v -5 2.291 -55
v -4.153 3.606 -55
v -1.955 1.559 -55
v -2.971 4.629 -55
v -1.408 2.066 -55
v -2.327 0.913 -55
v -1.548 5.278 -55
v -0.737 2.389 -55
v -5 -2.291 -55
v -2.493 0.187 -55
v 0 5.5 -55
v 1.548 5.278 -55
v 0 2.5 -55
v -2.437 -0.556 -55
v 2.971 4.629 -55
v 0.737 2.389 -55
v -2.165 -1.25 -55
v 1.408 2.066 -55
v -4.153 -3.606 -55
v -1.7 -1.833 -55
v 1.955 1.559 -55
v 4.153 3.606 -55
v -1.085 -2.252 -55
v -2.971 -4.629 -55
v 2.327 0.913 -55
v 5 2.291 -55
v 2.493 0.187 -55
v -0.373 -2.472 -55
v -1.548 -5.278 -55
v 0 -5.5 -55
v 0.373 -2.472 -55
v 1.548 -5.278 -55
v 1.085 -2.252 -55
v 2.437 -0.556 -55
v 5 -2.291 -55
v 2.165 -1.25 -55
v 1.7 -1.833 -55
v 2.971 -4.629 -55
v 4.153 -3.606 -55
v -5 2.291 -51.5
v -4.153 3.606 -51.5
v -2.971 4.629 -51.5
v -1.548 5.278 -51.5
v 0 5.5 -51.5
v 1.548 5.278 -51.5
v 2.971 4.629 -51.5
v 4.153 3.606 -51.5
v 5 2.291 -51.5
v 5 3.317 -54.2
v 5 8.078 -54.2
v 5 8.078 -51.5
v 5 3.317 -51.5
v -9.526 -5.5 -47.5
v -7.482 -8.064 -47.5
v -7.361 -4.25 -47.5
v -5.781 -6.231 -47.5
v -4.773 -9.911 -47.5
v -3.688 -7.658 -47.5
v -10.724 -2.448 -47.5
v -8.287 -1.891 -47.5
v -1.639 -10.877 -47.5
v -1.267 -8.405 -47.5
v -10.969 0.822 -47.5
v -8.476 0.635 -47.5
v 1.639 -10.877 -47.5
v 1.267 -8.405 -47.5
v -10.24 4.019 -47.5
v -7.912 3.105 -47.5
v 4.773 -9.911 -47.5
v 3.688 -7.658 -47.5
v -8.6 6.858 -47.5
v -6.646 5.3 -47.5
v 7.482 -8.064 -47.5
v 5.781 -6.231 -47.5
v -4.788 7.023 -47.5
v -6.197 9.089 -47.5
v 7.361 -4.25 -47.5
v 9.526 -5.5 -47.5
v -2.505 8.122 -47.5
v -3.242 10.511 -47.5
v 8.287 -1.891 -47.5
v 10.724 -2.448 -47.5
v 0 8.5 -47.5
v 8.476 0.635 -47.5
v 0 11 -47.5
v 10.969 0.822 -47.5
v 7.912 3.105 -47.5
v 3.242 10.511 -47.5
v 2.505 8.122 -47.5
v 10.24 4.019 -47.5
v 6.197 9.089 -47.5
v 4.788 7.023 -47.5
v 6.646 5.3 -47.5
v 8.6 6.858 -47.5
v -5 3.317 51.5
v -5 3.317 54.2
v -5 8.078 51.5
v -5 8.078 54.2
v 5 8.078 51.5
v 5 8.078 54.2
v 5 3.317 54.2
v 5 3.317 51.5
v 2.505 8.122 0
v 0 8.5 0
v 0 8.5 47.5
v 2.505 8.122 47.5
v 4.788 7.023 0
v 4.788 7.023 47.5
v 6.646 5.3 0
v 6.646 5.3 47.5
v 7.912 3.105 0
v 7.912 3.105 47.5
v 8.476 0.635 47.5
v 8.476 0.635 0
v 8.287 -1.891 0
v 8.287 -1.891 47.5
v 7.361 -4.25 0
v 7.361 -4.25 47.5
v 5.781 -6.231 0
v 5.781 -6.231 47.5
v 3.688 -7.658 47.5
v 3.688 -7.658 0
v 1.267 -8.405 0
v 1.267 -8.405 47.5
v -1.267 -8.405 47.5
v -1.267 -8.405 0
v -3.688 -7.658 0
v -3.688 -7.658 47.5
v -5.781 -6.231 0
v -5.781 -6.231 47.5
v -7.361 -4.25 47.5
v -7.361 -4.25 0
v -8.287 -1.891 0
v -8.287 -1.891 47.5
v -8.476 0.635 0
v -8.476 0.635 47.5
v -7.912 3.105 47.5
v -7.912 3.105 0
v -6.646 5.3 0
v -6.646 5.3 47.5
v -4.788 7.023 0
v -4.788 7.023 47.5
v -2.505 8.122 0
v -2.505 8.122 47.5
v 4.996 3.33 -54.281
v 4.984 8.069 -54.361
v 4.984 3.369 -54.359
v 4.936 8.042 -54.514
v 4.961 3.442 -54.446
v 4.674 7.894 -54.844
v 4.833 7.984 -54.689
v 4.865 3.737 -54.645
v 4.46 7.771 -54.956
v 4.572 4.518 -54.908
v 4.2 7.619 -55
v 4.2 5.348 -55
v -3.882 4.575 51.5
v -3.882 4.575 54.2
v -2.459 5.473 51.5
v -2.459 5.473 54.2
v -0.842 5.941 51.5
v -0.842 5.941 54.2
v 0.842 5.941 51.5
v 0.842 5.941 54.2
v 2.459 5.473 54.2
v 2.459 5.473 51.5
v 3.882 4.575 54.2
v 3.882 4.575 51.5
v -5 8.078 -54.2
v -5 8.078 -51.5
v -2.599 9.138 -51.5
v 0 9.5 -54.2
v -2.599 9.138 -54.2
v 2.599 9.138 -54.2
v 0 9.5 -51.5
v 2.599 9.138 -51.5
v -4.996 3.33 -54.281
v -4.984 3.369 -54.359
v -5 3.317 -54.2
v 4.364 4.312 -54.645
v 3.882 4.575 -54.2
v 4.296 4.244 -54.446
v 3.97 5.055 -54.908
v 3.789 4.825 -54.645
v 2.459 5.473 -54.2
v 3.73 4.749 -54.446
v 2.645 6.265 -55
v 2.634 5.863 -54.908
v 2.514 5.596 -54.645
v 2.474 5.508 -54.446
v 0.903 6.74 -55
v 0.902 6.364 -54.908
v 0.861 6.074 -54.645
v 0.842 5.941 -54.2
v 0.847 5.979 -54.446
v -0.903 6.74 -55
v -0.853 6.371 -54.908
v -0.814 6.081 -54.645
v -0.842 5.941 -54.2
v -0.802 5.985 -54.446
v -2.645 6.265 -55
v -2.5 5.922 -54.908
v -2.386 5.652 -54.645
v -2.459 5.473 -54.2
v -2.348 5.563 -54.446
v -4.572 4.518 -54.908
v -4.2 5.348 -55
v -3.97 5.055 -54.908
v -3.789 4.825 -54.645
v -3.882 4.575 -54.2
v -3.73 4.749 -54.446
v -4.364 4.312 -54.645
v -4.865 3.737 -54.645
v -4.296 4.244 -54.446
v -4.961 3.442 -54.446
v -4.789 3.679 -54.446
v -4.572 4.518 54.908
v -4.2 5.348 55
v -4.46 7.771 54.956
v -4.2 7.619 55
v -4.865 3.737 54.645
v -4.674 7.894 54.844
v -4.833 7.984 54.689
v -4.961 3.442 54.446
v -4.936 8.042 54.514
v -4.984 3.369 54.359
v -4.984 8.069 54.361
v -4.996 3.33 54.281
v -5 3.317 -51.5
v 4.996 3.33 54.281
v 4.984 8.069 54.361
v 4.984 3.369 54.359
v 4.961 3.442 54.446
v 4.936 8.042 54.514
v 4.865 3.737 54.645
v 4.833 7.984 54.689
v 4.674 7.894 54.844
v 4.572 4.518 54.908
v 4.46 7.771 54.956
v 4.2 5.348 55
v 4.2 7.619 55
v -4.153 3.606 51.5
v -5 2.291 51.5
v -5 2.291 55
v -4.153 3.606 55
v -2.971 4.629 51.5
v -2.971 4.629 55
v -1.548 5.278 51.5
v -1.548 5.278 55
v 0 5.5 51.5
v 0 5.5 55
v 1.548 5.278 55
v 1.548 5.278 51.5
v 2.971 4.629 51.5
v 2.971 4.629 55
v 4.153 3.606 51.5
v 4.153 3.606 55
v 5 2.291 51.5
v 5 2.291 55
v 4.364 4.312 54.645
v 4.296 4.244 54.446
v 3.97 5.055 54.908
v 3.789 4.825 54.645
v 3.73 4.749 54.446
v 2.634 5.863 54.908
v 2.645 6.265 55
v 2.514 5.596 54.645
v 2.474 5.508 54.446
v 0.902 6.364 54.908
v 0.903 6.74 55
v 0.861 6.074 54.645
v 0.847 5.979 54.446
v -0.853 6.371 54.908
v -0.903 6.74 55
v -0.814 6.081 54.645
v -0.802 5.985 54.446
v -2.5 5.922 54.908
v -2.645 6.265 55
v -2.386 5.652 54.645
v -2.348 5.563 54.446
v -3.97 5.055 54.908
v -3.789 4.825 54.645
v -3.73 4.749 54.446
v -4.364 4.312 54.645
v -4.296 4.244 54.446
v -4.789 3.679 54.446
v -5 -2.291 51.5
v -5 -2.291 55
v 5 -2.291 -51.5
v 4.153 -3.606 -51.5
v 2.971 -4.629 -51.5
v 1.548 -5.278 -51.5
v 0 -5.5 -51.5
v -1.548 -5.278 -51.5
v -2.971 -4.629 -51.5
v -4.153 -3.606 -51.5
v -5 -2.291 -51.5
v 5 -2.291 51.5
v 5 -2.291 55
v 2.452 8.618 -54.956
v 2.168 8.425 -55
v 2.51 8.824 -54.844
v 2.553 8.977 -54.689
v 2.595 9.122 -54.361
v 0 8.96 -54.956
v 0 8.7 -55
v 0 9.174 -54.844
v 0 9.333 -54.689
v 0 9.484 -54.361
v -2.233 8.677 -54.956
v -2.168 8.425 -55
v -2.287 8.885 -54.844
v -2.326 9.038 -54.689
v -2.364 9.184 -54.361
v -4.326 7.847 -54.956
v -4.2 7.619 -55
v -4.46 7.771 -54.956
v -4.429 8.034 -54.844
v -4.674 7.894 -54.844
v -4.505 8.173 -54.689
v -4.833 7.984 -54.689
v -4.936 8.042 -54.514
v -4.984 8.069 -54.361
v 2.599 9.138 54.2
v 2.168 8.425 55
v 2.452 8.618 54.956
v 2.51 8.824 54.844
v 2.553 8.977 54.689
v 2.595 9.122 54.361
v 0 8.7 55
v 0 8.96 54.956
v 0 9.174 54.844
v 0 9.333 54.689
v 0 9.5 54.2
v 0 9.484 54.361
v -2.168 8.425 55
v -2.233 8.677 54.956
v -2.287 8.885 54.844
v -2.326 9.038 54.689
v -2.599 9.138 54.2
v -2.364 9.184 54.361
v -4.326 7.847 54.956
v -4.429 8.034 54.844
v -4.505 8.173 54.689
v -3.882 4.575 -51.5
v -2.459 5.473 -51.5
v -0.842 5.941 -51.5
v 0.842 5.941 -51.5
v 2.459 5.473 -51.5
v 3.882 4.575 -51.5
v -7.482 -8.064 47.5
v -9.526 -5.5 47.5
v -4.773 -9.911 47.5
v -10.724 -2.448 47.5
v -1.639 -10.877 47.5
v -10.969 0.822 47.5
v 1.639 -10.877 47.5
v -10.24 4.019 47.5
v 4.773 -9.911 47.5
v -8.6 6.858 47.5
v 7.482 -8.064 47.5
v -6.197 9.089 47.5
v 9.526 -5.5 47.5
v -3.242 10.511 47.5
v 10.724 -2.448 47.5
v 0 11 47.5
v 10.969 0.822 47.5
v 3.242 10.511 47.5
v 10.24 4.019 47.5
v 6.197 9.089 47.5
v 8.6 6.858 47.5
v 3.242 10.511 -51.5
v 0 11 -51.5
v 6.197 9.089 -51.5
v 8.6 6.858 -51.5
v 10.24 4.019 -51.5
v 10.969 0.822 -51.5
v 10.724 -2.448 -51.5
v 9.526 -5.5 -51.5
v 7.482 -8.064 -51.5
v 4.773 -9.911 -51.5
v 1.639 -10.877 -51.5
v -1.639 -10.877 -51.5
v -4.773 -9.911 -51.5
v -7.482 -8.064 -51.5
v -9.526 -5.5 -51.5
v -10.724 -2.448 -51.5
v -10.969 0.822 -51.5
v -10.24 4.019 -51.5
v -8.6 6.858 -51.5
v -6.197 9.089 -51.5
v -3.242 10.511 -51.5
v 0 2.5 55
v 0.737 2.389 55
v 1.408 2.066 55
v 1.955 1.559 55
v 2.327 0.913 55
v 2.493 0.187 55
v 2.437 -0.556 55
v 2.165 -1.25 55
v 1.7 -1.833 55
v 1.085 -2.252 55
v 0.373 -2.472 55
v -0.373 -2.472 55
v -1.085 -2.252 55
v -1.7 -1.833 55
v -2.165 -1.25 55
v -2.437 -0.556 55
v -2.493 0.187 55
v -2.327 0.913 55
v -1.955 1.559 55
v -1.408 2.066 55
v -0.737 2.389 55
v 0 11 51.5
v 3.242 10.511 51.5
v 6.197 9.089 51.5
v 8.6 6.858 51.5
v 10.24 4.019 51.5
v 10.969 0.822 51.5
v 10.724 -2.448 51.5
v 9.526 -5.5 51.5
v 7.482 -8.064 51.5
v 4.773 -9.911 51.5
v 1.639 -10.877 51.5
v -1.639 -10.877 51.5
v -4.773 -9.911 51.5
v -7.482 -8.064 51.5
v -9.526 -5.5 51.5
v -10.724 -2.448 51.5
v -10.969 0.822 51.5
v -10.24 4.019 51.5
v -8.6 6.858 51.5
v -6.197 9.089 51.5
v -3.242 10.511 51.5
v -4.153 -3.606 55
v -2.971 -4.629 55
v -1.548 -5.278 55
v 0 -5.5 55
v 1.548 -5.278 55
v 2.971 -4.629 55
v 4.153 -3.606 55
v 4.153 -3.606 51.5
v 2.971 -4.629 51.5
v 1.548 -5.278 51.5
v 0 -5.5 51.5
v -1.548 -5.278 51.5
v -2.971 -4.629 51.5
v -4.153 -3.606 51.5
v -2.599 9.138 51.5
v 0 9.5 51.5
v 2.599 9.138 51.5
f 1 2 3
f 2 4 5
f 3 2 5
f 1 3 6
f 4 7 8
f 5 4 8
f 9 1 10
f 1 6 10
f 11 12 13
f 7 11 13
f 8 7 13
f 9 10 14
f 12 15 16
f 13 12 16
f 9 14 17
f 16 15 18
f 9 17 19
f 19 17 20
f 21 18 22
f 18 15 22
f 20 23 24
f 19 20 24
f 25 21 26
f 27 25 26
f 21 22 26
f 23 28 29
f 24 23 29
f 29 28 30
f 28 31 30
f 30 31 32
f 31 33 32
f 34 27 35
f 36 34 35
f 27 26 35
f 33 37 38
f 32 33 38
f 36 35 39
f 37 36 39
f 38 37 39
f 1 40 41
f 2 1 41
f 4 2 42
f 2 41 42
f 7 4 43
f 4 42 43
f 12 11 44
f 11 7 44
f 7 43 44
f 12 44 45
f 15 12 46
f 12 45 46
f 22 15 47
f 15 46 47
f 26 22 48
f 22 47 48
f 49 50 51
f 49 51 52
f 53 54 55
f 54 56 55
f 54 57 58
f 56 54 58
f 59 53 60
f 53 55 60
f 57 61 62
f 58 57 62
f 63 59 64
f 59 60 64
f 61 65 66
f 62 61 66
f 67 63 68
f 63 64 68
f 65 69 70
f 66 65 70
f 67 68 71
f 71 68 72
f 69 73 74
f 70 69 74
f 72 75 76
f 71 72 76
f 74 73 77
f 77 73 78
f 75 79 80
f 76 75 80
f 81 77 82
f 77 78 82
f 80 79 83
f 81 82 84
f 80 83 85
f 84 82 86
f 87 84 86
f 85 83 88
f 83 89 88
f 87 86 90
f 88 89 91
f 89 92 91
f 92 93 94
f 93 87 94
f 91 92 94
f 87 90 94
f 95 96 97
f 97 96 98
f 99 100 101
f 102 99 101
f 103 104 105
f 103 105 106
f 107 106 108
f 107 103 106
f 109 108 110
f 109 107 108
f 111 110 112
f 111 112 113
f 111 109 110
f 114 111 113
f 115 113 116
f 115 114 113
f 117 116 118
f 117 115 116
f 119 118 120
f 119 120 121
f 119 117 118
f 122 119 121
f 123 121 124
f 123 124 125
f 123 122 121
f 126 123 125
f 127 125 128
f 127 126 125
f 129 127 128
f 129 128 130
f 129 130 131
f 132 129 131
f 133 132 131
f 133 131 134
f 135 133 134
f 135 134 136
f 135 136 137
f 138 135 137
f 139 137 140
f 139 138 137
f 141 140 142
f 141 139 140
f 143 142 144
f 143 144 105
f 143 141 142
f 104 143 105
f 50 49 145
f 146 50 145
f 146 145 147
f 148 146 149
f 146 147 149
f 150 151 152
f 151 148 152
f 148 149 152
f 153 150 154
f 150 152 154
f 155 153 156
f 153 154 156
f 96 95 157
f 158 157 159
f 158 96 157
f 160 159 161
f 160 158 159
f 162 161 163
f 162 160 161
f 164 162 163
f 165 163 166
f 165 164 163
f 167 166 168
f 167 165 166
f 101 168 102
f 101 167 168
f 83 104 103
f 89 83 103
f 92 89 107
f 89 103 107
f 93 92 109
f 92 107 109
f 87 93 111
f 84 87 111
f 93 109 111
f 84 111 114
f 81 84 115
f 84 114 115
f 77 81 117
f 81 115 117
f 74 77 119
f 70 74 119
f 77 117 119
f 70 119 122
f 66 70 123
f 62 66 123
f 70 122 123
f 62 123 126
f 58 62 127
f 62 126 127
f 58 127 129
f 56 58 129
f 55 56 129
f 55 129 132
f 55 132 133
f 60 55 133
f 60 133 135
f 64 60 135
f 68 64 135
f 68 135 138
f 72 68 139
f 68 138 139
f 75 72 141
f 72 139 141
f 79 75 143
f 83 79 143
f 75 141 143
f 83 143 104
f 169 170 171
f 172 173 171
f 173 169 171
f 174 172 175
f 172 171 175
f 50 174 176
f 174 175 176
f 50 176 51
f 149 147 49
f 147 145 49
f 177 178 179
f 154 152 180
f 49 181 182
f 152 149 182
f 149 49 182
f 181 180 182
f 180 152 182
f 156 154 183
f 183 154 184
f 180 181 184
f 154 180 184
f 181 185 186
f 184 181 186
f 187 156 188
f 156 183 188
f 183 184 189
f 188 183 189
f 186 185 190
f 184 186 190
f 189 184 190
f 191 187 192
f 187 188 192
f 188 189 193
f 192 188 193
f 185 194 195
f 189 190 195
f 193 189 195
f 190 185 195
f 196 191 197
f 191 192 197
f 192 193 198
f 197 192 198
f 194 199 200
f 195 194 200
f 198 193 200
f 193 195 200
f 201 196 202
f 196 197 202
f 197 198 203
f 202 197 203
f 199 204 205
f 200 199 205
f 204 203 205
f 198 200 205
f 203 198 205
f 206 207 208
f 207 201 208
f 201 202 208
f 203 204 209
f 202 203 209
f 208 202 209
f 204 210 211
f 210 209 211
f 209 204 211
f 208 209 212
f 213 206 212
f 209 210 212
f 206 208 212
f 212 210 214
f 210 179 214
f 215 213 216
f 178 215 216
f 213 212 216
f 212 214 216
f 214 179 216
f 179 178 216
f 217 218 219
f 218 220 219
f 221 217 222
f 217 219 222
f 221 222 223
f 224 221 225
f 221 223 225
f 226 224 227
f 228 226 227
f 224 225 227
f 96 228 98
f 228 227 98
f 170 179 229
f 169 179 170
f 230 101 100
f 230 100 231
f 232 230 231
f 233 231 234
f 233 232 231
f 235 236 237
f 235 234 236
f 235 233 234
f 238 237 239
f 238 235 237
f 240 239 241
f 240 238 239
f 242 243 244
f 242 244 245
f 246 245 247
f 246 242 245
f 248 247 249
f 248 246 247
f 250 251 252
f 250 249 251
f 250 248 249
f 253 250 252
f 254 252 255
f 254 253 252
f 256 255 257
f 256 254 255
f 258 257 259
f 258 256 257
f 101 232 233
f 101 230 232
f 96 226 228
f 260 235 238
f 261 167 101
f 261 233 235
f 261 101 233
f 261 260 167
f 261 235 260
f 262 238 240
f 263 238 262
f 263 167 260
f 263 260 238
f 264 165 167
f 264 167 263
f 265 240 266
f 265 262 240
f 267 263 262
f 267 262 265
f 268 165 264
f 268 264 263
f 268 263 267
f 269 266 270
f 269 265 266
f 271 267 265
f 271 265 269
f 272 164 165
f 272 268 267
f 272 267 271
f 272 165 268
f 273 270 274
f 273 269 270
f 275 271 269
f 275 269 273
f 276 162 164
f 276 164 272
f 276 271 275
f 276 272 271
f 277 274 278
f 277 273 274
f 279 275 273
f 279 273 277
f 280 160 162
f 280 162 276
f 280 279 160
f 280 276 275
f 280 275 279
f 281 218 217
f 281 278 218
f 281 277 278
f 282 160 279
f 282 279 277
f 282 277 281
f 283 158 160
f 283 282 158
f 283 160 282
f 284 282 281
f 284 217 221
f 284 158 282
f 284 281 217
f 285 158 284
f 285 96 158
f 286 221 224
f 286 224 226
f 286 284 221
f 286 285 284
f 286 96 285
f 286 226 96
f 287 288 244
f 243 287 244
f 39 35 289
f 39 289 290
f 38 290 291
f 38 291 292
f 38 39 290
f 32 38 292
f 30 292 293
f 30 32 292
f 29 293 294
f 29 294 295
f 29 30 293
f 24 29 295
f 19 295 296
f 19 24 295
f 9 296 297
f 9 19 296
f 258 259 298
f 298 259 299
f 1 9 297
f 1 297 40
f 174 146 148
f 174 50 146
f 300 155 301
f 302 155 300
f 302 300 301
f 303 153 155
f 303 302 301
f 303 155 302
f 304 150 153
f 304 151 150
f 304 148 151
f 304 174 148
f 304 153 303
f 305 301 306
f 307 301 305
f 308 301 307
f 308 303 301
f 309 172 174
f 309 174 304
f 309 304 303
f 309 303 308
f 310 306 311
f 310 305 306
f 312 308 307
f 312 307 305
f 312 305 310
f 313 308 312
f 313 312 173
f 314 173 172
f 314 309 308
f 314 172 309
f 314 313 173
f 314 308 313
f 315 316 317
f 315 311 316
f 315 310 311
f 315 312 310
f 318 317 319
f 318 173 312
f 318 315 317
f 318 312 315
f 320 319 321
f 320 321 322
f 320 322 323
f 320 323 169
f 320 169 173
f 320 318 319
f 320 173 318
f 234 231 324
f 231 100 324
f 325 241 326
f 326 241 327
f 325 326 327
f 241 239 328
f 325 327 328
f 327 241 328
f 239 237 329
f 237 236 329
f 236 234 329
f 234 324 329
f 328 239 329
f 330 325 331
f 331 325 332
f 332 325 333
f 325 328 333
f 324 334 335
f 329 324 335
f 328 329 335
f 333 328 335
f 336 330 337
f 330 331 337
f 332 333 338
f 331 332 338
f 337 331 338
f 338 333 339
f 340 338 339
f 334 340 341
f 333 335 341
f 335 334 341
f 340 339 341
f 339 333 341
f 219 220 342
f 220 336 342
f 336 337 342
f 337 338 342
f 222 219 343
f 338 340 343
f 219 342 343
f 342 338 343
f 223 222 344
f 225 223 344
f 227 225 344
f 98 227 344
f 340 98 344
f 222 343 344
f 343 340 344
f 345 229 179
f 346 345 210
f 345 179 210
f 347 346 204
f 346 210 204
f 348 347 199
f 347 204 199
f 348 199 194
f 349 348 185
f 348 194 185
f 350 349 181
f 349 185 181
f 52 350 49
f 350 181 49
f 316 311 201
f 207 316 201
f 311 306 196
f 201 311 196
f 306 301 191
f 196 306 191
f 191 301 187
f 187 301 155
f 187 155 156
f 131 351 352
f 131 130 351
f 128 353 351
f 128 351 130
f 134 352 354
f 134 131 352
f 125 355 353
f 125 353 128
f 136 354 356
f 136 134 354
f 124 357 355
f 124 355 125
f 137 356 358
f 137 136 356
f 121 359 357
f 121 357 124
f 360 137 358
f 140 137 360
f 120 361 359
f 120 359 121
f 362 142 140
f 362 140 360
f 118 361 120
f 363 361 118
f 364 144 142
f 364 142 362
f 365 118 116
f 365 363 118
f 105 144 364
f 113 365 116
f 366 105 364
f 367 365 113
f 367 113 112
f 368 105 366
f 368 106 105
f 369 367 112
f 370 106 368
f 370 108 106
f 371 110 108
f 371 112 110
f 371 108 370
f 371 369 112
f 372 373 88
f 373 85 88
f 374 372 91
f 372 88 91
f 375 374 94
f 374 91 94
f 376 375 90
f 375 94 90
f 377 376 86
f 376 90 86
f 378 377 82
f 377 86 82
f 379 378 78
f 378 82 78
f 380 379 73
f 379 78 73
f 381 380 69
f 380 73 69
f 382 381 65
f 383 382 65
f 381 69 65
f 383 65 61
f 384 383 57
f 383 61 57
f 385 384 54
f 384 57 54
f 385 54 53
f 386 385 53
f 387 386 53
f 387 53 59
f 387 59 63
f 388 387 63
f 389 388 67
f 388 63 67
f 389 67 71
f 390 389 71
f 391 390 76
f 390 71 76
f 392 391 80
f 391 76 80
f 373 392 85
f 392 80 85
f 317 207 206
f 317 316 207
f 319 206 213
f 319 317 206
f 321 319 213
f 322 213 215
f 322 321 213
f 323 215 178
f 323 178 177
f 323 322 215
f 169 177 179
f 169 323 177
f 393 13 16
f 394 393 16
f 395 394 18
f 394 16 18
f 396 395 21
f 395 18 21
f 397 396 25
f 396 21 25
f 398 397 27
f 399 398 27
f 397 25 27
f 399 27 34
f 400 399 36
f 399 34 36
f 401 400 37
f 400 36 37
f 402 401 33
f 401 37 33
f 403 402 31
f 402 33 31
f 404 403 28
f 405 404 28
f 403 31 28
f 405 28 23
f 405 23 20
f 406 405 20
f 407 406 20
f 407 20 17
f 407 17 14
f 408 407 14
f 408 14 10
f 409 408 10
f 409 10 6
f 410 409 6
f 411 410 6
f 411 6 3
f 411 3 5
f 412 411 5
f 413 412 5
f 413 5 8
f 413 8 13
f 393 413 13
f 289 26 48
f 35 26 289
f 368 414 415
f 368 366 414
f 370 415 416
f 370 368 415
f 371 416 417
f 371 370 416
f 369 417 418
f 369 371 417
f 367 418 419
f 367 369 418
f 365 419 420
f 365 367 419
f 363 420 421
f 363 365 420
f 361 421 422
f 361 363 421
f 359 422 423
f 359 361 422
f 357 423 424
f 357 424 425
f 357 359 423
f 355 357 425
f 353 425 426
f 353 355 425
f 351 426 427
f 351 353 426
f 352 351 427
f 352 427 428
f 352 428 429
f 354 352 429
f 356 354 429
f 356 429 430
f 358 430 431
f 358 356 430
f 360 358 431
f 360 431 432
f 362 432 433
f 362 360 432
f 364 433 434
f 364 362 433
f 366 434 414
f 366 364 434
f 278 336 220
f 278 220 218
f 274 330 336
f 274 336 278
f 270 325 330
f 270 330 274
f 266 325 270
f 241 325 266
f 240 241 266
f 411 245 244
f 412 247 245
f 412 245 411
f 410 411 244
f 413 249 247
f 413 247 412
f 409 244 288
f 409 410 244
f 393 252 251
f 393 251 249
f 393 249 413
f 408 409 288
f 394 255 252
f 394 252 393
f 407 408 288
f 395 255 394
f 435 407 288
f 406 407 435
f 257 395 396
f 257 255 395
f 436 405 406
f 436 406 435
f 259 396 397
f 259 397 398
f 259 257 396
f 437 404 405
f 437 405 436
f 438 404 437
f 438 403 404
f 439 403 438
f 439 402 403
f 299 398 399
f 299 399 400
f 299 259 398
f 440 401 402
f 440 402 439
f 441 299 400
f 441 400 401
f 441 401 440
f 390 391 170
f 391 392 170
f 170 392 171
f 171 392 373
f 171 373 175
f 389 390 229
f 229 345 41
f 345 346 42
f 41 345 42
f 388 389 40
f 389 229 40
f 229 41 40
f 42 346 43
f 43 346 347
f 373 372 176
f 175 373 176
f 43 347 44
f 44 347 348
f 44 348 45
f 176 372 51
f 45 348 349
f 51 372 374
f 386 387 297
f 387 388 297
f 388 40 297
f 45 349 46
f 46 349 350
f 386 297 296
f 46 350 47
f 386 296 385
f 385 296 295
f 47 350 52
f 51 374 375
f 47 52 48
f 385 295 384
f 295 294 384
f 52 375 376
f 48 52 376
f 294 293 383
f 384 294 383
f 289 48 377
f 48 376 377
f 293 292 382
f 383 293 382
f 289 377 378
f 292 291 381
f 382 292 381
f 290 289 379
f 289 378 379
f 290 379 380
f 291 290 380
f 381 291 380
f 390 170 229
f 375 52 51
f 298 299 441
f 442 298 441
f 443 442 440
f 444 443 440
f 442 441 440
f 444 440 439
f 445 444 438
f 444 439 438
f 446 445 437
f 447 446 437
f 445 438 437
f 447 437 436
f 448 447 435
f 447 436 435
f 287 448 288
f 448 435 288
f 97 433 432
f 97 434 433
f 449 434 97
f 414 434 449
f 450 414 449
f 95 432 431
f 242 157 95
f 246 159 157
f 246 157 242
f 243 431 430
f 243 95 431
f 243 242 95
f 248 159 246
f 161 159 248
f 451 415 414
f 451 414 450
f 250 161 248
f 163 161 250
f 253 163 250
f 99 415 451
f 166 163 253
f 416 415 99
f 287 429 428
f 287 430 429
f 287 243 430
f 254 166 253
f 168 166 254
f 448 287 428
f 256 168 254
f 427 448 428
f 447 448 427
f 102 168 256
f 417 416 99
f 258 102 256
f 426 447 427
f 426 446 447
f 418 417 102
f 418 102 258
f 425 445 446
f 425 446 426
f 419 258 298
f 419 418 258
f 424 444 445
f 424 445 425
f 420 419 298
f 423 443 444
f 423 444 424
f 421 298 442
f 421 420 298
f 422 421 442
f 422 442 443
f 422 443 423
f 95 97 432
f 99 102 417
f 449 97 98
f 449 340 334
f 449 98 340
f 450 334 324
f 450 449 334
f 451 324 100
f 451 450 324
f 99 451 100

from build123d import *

# Parameters (mm, degrees)
CORTAR_EXTRUIR1_DEPTH = 3.5
REDONDEO1_R           = 0.8


with BuildPart() as part:
    # Croquis1 → Revolución1 (revolve)
    with BuildSketch(Plane(origin=(0, 0, 0), x_dir=(0, 0, -1), z_dir=(1, 0, 0))):
        Polygon((0, 2.5), (-55, 2.5), (-55, 5.5), (-51.5, 5.5), (-51.5, 6), (-55, 6), (-55, 9.5), (-51.5, 9.5), (-51.5, 11), (-47.5, 11), (-47.5, 8.5), (0, 8.5), align=None)
    revolve(axis=Axis((0, 0, 58.146951639), (0, 0, -1)))

    # Croquis2 → Cortar-Extruir1 (cut)
    with BuildSketch(Plane.XY.offset(55)):
        with BuildLine():
            Line((-5, 0), (-5, 8.077747211))
            ThreePointArc((-5, 8.077747211), (0, -9.5), (5, 8.077747211))
            Line((5, 8.077747211), (5, 0))
            Line((5, 0), (5, -2.291287847))
            ThreePointArc((5, -2.291287847), (0, -5.5), (-5, -2.291287847))
            Line((-5, -2.291287847), (-5, 0))
        make_face()
    extrude(amount=-CORTAR_EXTRUIR1_DEPTH, mode=Mode.SUBTRACT)

    # Redondeo1
    redondeo1_edges = [part.edges().sort_by_distance(p)[0] for p in [
        (0, 9.5, 55),
        (0, 6, 55),
        (5, 5.697186001, 55),
        (-5, 5.697186001, 55),
    ]]
    fillet(redondeo1_edges, radius=REDONDEO1_R)

    # Simetría1: part across plane


with BuildPart() as part_1:
    add(part.part)
    add(part.part.mirror(Plane.XY))


solid = part_1.part
